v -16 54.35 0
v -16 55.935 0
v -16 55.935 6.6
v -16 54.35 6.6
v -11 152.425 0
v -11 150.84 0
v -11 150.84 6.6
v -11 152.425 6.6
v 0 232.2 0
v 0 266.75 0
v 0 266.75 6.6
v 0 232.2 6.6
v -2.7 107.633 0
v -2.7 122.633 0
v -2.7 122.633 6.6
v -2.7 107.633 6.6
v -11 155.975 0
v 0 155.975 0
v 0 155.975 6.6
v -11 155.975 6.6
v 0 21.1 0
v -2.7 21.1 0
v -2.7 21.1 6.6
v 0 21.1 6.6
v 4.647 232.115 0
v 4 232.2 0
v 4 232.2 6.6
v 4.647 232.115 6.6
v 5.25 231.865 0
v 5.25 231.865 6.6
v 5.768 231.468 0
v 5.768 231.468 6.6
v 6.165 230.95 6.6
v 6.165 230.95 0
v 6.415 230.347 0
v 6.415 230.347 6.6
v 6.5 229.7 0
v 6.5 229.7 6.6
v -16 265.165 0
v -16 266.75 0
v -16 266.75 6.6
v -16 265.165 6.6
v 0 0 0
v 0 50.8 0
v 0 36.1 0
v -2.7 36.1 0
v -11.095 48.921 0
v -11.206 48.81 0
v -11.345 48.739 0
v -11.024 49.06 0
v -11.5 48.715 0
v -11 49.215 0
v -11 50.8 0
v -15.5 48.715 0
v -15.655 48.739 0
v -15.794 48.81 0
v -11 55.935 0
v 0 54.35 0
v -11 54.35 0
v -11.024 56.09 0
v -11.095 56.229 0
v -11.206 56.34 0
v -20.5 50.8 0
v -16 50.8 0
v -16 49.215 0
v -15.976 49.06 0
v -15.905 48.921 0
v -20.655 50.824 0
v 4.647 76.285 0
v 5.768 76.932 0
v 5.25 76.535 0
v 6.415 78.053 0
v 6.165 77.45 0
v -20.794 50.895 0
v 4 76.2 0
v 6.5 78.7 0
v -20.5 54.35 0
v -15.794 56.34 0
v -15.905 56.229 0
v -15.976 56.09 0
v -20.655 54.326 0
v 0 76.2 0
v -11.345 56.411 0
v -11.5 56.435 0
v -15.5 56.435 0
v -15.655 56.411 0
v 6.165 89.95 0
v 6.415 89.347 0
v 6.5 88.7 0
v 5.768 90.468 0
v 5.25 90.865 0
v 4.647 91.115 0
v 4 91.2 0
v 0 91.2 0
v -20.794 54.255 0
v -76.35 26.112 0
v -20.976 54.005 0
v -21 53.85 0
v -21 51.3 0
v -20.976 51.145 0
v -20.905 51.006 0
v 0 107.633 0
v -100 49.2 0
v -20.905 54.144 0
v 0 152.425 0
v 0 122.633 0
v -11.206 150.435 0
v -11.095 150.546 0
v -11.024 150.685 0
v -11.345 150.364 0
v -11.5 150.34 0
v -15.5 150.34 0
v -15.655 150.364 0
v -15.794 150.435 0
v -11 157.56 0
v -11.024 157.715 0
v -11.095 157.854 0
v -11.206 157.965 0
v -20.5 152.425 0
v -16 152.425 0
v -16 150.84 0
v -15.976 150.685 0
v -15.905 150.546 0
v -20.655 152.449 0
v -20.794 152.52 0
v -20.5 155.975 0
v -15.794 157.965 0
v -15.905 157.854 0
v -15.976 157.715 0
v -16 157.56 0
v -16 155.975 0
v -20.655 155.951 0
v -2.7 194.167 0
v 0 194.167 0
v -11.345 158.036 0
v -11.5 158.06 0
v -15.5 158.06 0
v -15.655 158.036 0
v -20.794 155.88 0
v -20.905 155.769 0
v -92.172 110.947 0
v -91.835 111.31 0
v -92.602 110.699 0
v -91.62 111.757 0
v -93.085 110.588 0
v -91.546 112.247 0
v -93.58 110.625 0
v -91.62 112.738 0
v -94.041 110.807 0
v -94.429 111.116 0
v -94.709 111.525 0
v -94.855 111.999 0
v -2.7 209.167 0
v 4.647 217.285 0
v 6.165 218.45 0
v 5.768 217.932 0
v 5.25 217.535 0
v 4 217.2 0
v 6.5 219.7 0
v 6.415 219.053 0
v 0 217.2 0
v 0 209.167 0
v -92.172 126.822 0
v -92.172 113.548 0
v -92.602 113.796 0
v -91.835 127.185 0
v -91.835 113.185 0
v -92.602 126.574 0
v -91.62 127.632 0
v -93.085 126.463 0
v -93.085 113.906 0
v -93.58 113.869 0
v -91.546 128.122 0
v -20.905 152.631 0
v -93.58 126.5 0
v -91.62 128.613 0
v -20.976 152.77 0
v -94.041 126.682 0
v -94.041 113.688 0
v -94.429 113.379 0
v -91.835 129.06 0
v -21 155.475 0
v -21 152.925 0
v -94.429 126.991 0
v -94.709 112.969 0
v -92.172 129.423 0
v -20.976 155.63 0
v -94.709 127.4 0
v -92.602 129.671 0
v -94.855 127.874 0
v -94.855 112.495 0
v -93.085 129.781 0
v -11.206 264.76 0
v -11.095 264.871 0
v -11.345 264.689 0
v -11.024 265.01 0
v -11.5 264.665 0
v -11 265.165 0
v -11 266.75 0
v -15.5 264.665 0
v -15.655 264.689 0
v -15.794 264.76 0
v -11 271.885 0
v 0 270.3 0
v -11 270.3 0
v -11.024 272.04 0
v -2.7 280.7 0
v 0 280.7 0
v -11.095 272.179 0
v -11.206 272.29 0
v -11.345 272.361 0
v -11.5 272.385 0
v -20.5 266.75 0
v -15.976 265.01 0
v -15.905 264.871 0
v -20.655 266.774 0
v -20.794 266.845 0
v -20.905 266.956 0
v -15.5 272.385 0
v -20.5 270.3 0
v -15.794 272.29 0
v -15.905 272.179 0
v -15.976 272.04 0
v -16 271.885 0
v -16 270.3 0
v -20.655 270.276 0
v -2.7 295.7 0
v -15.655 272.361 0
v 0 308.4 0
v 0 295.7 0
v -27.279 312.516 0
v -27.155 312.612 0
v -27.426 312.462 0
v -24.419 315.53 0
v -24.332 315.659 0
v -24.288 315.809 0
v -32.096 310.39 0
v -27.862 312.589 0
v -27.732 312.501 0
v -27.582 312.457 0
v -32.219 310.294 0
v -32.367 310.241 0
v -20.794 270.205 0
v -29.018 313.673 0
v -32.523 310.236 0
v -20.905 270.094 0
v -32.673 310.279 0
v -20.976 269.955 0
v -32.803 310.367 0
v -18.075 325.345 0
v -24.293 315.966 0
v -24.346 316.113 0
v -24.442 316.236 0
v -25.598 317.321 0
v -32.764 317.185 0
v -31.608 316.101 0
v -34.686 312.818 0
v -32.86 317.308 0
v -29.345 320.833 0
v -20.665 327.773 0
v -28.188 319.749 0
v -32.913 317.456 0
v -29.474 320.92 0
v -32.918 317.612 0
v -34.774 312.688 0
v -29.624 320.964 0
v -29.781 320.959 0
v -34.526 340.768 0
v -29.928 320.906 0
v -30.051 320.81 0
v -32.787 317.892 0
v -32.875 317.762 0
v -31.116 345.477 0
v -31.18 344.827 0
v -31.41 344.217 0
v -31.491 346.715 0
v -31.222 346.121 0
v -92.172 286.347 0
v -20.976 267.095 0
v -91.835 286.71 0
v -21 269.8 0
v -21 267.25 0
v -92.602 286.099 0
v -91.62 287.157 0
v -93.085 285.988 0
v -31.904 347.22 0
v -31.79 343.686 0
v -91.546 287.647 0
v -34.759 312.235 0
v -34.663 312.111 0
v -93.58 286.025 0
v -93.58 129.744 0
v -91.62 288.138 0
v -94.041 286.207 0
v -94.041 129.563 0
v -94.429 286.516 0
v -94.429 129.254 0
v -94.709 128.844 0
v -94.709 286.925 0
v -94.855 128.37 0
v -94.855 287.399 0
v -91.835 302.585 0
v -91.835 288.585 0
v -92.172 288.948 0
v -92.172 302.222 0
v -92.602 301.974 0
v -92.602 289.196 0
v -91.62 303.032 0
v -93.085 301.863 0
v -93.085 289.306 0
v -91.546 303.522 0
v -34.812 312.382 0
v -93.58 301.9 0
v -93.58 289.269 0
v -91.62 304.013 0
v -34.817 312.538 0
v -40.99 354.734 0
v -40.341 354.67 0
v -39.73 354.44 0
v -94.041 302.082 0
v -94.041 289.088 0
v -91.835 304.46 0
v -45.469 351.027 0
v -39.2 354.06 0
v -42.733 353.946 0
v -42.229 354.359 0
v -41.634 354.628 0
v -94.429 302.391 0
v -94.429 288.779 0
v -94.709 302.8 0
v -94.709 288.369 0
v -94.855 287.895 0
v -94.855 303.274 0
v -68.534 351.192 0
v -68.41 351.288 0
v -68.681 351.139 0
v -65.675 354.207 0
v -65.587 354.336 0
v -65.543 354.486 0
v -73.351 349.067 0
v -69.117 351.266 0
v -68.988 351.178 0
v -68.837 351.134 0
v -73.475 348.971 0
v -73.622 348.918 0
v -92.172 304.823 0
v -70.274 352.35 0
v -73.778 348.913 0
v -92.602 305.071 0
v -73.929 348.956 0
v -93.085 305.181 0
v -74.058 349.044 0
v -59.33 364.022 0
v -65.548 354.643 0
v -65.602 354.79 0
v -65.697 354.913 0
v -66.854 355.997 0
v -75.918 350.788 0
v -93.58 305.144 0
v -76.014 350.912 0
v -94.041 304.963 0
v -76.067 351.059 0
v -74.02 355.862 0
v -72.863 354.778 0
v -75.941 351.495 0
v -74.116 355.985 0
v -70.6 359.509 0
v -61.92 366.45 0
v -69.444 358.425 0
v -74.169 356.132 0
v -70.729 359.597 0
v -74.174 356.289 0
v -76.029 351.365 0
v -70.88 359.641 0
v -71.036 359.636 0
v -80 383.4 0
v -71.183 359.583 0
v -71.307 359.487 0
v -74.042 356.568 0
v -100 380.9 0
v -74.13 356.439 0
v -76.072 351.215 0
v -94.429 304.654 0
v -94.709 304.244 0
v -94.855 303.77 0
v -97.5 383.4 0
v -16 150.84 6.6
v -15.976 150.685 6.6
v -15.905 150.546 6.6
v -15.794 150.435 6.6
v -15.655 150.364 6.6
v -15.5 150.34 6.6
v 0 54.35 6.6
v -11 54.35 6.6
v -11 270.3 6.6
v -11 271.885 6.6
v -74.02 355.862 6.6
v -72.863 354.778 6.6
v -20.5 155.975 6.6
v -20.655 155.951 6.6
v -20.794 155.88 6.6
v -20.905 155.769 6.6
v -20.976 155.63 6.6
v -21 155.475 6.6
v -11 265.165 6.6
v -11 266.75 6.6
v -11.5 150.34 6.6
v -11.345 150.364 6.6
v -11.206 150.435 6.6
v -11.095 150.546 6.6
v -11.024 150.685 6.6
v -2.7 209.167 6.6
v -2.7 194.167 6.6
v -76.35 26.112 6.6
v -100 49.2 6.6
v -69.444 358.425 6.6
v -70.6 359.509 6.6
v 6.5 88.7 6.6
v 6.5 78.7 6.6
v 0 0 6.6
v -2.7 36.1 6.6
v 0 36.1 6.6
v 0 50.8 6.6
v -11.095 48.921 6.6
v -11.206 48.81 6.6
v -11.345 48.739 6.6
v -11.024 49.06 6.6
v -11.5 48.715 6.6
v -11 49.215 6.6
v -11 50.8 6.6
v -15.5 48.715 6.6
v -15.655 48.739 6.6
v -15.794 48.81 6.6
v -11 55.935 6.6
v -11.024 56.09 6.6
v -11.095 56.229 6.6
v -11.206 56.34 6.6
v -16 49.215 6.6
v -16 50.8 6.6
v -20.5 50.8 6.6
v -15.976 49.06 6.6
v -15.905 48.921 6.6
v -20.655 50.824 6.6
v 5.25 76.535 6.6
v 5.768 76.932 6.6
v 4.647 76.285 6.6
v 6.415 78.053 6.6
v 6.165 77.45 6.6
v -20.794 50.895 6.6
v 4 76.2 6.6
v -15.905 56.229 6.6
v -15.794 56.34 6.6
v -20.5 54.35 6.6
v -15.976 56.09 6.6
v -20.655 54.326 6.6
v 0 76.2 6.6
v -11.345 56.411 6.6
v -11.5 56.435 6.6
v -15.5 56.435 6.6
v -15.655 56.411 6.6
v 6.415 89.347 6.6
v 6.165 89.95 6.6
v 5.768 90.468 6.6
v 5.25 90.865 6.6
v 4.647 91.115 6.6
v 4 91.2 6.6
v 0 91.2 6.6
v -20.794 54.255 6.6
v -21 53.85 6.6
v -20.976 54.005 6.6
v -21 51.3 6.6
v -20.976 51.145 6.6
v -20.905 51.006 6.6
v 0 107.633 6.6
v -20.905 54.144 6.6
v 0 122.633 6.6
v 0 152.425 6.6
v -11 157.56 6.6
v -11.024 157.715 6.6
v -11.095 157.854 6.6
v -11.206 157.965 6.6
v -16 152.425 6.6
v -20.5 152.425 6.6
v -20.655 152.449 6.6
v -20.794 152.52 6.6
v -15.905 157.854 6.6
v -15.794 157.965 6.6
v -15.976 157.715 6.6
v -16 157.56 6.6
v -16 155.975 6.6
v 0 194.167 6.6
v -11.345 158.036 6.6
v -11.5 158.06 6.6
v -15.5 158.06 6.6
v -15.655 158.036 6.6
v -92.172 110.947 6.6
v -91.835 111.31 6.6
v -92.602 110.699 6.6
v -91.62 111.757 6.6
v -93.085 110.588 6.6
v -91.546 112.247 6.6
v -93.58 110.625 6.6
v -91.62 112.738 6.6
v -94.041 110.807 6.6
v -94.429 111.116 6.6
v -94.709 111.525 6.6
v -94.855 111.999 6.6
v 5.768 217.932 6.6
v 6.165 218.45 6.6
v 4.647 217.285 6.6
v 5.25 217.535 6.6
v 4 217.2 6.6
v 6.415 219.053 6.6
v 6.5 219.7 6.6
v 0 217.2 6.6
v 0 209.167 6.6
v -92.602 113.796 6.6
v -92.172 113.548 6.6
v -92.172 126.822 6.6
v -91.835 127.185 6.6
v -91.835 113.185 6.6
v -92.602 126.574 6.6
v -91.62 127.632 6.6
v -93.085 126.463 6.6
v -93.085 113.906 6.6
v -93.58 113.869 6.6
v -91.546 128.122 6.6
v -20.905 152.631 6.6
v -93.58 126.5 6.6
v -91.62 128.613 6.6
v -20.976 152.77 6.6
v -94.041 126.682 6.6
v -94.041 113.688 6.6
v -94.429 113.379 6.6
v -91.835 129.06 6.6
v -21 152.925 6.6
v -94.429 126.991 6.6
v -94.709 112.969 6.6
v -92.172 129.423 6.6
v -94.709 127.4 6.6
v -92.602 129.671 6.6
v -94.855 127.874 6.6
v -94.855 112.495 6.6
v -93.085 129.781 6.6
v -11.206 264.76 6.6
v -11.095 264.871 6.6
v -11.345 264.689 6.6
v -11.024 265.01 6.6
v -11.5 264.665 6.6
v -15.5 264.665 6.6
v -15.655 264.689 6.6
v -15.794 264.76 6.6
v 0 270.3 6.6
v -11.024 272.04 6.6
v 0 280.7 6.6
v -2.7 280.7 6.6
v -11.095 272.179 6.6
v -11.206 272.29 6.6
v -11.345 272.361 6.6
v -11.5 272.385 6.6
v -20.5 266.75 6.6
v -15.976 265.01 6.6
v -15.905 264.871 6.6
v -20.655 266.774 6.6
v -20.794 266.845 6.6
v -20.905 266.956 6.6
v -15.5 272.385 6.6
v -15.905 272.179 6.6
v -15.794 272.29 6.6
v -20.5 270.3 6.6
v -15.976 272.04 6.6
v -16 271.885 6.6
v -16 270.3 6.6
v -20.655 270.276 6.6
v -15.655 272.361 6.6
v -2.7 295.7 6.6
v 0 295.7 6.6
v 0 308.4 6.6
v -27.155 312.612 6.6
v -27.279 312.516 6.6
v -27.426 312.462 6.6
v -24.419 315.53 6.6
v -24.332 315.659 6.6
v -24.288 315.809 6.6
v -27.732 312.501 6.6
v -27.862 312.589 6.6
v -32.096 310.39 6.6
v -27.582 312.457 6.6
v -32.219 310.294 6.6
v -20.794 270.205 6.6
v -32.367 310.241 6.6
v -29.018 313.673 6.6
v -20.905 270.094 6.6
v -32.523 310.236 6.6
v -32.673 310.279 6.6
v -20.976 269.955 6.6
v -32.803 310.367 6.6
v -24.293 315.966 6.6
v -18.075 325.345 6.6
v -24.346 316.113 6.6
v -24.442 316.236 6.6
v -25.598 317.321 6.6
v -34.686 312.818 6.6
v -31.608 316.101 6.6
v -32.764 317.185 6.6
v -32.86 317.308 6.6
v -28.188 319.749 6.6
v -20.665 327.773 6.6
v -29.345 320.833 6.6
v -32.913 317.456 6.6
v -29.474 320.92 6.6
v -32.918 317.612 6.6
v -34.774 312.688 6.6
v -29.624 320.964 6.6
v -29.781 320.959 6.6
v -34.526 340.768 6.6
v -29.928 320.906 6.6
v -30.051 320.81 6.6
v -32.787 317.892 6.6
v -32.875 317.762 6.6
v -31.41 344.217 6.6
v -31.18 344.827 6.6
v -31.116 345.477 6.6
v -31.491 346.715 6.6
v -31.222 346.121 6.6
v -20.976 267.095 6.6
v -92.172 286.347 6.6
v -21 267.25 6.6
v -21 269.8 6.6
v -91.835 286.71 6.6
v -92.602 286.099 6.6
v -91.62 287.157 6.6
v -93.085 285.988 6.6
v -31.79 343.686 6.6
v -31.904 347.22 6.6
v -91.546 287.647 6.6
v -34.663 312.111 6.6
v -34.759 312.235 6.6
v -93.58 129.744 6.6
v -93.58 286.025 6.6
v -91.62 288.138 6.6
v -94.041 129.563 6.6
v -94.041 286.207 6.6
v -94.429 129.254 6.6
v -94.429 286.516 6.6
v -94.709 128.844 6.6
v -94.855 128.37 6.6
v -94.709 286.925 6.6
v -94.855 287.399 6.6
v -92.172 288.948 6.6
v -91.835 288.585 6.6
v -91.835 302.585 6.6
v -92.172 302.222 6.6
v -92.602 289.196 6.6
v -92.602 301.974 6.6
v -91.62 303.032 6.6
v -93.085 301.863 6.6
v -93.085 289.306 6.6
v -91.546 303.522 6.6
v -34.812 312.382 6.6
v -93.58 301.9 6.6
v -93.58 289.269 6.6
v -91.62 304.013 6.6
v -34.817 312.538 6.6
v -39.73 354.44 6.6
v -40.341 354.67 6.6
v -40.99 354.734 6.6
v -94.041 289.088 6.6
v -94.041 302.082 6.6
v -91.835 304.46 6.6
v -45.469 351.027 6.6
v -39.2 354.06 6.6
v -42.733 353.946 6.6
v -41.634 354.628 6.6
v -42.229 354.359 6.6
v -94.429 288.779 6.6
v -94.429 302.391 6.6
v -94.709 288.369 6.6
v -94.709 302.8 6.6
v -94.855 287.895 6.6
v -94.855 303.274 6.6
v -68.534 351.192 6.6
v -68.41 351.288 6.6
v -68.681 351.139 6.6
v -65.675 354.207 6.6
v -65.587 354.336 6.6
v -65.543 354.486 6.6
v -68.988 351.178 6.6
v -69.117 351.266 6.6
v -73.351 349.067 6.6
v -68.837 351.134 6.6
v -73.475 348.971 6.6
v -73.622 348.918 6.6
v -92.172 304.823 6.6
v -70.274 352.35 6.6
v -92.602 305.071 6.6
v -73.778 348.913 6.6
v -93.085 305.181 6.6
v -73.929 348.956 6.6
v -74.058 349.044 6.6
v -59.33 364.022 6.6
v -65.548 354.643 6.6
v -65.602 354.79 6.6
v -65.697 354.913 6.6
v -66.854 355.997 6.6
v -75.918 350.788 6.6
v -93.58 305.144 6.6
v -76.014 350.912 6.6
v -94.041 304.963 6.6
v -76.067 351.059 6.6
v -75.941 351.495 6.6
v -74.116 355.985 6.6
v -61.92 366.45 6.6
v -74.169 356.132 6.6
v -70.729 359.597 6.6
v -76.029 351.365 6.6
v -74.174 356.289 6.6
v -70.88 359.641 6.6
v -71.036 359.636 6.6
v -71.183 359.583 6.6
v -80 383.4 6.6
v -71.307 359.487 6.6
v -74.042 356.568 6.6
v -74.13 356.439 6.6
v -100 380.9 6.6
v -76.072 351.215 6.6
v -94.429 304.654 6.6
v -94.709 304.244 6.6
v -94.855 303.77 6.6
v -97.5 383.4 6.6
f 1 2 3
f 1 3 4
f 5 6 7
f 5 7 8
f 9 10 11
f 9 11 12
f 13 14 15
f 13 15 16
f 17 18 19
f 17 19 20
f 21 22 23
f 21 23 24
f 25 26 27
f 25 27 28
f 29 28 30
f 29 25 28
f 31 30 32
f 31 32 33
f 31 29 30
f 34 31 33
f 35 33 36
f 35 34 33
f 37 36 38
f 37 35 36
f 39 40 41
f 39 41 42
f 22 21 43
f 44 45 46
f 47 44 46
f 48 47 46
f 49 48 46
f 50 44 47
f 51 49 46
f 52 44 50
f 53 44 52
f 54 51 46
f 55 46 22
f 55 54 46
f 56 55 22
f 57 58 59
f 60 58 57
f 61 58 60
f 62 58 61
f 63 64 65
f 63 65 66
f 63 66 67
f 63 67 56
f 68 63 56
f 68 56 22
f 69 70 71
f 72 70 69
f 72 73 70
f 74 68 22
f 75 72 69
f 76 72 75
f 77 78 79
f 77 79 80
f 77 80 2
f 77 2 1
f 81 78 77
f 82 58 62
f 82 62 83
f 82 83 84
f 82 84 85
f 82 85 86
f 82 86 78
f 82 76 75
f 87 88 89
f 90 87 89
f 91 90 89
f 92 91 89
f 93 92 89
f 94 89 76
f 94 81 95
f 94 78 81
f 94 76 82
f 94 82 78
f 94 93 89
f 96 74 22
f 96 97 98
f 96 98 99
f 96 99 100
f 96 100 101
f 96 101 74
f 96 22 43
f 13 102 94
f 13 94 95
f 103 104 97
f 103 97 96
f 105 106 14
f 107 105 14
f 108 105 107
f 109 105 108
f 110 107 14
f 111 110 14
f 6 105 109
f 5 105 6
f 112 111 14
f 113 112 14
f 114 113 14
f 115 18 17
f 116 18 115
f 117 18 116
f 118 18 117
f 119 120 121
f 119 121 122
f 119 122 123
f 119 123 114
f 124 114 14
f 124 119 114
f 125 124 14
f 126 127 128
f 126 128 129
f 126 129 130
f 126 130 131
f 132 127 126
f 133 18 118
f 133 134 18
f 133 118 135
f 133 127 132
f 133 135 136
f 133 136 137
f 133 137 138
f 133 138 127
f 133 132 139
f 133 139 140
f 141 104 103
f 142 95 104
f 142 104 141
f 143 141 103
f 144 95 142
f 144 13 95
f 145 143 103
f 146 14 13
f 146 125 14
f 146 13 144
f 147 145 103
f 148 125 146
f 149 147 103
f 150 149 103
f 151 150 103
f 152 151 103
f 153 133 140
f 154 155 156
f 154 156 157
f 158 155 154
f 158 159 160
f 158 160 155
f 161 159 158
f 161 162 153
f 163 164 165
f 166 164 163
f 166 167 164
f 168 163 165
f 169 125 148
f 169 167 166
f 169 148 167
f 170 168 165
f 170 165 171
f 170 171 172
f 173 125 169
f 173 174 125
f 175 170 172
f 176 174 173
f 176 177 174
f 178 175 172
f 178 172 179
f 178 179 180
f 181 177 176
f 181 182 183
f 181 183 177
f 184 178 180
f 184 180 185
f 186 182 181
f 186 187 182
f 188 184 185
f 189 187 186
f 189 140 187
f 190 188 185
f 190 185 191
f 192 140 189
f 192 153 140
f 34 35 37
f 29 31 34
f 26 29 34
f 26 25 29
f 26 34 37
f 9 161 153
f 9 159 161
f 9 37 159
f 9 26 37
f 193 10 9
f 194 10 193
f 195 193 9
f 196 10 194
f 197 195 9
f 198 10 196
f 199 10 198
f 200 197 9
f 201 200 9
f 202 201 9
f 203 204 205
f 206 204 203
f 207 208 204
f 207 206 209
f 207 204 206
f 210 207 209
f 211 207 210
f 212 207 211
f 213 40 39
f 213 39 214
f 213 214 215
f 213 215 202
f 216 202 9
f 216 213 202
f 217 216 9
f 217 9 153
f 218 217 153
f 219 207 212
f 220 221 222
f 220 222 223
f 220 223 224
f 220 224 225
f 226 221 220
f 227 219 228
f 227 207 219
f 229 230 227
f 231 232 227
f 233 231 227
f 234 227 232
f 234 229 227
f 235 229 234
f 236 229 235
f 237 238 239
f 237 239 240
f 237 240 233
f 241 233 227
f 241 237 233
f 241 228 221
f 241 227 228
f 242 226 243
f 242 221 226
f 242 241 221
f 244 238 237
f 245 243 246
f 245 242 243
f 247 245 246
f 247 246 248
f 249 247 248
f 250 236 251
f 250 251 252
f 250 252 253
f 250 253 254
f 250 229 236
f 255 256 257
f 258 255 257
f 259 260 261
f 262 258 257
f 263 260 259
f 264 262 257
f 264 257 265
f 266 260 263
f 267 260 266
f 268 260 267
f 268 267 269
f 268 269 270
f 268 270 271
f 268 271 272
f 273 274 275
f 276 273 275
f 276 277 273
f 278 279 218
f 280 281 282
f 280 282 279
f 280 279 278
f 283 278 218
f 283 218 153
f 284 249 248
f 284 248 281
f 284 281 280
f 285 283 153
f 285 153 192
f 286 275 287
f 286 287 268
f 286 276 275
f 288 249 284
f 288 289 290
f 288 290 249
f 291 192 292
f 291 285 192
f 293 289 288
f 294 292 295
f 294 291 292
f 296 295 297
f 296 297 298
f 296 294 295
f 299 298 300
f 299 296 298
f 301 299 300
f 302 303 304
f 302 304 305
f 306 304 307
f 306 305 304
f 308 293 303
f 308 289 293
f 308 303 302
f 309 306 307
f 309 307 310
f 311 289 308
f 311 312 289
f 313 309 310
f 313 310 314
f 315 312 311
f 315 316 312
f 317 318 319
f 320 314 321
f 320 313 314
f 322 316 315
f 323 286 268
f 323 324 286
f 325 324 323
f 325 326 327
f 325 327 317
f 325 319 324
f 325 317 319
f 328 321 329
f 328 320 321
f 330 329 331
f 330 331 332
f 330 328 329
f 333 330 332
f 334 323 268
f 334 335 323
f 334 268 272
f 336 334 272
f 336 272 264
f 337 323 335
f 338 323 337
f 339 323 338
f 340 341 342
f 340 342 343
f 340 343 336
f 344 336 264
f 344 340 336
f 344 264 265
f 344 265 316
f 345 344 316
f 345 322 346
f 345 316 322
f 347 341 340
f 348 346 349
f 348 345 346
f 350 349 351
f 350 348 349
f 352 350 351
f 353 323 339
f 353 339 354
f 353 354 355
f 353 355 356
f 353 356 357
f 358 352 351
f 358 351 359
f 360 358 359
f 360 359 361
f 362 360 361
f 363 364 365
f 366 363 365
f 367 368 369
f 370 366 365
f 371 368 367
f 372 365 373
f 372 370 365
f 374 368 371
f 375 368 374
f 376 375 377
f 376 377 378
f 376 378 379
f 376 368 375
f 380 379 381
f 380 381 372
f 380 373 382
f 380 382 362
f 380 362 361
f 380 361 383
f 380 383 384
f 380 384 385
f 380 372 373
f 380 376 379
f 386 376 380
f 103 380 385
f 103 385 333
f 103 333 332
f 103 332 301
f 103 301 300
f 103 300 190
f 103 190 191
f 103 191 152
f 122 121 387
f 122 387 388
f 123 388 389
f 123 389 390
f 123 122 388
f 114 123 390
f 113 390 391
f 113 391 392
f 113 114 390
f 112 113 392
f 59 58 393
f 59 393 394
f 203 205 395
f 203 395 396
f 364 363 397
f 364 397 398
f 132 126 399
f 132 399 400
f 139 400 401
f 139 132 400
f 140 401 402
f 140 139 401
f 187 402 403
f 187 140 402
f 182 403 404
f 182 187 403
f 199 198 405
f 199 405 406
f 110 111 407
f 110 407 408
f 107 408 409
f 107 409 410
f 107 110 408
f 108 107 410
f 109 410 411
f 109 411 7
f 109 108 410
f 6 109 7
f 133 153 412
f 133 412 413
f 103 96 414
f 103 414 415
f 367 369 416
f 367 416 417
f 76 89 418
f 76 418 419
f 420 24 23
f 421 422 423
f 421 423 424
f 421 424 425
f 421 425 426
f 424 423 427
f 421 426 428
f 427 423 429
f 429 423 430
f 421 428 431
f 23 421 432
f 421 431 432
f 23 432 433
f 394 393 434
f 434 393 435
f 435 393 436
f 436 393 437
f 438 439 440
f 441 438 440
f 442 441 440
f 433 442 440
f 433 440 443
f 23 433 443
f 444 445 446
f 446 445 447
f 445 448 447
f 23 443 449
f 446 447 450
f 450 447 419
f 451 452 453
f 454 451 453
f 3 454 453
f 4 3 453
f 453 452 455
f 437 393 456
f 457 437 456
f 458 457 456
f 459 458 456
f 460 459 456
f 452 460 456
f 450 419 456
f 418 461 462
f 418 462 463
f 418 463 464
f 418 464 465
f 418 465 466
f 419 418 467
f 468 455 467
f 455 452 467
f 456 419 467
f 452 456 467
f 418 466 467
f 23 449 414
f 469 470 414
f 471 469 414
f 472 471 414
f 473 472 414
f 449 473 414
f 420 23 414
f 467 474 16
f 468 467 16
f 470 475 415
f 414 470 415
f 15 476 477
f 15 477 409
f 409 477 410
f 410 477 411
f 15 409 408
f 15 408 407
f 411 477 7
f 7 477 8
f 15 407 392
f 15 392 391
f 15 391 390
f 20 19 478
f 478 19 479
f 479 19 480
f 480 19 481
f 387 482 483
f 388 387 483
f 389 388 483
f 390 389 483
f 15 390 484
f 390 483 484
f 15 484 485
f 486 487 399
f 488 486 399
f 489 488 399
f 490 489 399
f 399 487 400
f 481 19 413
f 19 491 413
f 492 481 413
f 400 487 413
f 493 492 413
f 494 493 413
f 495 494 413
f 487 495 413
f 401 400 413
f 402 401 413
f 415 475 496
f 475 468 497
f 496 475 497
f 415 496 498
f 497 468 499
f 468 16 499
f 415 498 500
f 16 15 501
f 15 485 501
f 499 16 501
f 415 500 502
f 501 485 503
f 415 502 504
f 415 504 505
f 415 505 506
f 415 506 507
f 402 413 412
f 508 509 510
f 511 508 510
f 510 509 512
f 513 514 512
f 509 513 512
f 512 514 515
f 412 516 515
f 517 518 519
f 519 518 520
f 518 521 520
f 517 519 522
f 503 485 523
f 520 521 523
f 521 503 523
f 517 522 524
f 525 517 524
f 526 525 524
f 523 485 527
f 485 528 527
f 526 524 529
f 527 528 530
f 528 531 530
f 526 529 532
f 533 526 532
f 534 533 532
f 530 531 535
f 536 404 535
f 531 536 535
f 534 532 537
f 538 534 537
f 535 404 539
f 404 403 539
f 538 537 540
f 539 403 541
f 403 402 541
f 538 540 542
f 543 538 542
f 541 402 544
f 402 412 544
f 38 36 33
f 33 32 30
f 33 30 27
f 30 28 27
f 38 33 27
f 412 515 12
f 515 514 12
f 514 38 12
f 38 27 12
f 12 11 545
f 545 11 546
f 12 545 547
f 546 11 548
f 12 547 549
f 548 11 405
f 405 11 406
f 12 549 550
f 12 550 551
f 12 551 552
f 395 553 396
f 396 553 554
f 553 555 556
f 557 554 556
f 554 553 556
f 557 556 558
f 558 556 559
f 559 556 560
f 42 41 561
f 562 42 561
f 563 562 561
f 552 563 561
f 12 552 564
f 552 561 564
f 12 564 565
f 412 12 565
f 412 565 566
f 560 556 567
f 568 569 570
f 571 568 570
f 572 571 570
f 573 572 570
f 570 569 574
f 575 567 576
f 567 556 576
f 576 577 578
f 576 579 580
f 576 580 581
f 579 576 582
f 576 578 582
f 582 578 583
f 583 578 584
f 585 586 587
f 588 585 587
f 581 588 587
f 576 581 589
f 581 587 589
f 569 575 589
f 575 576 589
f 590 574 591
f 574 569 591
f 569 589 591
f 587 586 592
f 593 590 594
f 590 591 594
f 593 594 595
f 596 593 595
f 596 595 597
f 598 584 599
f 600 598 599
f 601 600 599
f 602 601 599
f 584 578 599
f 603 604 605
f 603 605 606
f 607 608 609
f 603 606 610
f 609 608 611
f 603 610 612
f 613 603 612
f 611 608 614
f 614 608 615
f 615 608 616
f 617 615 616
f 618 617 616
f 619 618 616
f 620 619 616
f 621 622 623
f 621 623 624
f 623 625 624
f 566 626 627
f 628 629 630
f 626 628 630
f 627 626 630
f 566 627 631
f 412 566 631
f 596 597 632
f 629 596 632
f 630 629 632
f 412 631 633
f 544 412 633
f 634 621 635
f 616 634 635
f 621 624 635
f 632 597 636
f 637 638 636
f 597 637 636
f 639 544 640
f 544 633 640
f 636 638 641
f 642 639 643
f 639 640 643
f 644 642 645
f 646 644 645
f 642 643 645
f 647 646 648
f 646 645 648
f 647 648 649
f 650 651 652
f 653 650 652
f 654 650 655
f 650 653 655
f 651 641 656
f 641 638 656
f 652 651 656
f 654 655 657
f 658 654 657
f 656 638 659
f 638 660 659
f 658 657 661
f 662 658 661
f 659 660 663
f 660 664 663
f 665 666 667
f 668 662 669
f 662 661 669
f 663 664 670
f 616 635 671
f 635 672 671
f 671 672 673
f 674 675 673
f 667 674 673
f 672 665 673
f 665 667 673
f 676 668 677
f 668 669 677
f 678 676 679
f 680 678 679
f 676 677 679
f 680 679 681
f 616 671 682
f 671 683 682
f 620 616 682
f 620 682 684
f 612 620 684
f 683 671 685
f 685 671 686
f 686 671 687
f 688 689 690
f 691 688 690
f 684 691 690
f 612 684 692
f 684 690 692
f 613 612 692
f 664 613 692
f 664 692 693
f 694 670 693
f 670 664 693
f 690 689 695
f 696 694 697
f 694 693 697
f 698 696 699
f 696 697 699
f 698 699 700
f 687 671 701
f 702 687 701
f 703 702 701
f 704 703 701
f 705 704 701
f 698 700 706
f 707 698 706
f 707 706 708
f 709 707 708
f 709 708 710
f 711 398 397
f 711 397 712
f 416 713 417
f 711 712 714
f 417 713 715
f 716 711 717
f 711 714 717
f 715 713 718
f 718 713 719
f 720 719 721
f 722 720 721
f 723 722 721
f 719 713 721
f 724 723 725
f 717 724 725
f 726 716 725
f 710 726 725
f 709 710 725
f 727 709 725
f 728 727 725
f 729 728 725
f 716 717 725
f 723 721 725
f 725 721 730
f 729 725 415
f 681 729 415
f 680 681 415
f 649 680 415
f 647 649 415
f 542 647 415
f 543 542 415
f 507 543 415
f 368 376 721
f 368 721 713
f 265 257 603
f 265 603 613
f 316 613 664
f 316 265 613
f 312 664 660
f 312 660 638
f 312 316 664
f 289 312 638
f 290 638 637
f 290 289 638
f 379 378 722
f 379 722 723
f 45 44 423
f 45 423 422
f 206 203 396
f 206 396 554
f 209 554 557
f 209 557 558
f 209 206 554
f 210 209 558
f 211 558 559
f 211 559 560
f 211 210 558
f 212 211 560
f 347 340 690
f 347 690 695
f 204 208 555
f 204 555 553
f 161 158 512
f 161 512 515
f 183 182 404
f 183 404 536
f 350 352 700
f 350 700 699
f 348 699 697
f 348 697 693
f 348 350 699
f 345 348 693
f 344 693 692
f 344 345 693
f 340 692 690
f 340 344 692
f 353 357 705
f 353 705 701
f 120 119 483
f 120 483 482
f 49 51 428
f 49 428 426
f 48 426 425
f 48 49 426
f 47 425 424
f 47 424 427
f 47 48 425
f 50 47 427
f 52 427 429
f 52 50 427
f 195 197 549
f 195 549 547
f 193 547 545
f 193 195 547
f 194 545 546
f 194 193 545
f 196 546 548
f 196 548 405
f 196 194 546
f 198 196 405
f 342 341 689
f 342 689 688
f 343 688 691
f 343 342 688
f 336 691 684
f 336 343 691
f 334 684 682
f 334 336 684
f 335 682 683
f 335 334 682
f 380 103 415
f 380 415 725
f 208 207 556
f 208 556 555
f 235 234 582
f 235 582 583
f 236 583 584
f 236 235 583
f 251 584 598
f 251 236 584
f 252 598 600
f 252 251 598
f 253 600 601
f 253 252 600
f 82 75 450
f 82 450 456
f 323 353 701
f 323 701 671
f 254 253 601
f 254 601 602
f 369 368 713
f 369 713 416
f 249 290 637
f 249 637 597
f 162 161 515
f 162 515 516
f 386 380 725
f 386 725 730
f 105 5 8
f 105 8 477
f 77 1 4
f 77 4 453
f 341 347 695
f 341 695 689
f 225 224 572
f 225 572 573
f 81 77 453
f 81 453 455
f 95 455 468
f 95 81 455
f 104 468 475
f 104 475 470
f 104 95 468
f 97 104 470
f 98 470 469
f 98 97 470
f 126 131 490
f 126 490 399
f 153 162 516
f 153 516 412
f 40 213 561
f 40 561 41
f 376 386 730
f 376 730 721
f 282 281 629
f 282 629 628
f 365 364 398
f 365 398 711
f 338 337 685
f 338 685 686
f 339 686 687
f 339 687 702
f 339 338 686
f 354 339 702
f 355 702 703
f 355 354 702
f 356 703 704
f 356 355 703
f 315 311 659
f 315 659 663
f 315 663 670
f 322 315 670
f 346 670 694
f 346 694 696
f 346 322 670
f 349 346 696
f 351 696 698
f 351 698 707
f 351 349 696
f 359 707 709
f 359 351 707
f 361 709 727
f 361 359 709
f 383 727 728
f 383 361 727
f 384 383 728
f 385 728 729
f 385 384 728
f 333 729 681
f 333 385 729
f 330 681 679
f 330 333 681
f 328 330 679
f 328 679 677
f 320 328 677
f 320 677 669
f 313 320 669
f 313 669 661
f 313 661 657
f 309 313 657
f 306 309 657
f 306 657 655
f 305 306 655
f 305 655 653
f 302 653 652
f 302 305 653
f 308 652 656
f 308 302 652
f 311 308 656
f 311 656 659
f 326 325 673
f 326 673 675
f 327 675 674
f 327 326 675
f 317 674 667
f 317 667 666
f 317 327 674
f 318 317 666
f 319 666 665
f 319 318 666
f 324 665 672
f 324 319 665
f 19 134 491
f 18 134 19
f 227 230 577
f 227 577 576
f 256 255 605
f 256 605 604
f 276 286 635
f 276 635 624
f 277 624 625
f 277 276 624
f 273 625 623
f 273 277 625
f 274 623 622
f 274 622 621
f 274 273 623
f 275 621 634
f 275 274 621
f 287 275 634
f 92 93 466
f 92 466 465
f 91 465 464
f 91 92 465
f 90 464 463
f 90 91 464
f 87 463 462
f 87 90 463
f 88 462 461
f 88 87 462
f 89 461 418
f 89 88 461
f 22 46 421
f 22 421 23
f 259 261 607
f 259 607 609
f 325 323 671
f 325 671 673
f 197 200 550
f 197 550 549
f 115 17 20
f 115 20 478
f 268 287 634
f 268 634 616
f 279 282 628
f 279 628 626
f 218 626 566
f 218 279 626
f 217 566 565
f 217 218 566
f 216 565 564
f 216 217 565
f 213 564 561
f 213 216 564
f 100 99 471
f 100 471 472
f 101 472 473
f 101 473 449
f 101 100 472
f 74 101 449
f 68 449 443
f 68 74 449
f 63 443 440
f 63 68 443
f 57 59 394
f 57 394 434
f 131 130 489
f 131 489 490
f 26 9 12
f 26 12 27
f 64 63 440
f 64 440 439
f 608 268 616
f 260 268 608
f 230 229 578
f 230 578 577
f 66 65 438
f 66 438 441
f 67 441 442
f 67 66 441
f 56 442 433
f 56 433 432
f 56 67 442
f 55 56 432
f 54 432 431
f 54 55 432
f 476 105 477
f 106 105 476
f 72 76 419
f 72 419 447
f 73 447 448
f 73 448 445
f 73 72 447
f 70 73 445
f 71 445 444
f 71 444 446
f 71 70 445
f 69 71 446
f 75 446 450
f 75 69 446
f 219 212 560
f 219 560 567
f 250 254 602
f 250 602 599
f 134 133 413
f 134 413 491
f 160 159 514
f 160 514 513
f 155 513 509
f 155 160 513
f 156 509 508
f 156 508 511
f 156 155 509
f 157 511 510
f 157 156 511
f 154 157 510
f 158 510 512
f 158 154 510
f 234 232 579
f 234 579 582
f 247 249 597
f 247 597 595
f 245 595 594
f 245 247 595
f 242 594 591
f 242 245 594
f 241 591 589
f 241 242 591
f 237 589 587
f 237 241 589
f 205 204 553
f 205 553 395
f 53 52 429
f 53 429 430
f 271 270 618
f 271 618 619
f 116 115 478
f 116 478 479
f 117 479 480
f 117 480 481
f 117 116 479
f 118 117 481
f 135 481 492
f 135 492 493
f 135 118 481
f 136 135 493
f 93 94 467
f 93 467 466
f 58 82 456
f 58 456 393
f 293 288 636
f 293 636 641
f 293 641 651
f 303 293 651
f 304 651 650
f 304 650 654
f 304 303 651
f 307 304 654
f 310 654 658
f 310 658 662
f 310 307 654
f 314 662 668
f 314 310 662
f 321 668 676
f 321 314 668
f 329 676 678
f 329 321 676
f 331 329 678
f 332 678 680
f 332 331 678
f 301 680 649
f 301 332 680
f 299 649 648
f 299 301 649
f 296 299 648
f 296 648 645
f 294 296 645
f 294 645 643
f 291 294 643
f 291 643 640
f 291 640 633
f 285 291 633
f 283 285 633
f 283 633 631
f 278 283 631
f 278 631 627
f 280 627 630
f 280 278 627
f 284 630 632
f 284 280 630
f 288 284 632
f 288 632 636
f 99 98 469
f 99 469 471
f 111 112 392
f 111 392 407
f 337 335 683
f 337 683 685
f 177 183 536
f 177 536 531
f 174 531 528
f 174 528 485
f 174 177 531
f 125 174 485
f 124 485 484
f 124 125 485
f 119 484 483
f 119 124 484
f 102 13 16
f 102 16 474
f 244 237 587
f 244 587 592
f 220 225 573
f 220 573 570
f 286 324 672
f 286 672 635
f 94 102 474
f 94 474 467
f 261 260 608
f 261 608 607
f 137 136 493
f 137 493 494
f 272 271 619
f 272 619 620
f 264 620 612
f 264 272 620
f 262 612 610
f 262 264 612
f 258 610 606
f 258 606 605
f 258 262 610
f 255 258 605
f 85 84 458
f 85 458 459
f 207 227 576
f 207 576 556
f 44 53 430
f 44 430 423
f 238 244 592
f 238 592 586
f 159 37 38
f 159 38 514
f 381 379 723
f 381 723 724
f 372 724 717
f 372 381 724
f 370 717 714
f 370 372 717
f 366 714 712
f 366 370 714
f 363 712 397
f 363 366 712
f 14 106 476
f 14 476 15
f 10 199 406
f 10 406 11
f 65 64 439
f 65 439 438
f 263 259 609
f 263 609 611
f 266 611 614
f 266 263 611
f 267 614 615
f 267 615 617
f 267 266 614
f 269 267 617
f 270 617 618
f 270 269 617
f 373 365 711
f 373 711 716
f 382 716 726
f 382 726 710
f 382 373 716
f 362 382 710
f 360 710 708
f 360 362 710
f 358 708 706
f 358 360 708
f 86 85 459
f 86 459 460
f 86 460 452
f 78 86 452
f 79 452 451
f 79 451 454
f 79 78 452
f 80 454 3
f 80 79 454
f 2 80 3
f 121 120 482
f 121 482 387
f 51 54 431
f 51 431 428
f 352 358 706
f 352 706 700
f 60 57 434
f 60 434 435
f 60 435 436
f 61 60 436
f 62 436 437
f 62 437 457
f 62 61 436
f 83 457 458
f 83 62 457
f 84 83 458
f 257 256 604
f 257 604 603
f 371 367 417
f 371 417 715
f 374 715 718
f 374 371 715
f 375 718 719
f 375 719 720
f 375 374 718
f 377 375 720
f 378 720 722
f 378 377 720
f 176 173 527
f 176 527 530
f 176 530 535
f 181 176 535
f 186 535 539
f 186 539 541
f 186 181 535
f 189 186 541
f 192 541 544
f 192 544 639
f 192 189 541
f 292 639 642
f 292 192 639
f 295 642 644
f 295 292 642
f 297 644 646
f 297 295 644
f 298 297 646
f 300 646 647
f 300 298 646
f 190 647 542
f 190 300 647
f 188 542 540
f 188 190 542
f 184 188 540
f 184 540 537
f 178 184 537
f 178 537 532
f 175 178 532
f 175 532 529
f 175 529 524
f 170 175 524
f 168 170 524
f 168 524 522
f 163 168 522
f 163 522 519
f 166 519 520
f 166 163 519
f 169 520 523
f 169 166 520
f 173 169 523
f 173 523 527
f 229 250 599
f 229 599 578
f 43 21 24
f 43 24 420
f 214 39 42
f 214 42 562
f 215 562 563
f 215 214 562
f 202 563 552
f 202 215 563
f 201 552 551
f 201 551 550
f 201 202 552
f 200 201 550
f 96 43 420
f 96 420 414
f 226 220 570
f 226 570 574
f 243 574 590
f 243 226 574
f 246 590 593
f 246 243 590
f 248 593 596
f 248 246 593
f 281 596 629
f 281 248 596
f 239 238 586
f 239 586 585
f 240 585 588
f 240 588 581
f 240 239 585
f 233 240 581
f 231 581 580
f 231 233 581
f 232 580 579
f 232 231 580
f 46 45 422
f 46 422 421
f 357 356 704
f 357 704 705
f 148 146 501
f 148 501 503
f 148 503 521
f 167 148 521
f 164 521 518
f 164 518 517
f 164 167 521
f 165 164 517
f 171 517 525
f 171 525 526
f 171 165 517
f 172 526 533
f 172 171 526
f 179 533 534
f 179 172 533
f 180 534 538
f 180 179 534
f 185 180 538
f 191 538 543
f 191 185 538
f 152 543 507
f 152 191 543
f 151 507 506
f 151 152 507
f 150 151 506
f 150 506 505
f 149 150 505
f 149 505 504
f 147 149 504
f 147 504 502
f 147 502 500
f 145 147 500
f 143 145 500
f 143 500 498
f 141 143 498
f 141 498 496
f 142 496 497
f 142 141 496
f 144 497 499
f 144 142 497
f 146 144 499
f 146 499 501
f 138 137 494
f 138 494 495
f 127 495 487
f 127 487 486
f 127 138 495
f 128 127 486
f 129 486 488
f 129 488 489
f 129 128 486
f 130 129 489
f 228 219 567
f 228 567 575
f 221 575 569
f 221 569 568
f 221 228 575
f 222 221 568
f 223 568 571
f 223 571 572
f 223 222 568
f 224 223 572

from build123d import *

# Parameters (mm, degrees)
MODEL_R             = 1.6637
BOSS_EXTRUDE1_DEPTH = 6.6


with BuildPart() as part:
    # Model → Boss-Extrude1 (new body)
    with BuildSketch(Plane.XY):
        with BuildLine():
            Line((-2.7, 21.1), (0, 21.1))
            Line((0, 21.1), (0, 0))
            Line((0, 0), (-76.35, 26.1117))
            Line((-76.35, 26.1117), (-100, 49.2))
            Line((-100, 49.2), (-100, 380.9))
            Line((-100, 380.9), (-97.5, 383.4))
            Line((-97.5, 383.4), (-80, 383.4))
            Line((-80, 383.4), (-61.92031318, 366.450293606))
            Line((-61.92031318, 366.450293606), (-69.443665597, 358.42538436))
            Line((-69.443665597, 358.42538436), (-70.599982066, 359.50943105))
            ThreePointArc((-70.599982066, 359.50943105), (-70.958073277, 359.644402505), (-71.306721232, 359.486633012))
            Line((-71.306721232, 359.486633012), (-74.042485748, 356.568484196))
            ThreePointArc((-74.042485748, 356.568484196), (-74.177457203, 356.210392984), (-74.01968771, 355.861745029))
            Line((-74.01968771, 355.861745029), (-72.863371242, 354.77769834))
            Line((-72.863371242, 354.77769834), (-75.941106322, 351.494780921))
            ThreePointArc((-75.941106322, 351.494780921), (-76.076077777, 351.13668971), (-75.918308284, 350.788041755))
            Line((-75.918308284, 350.788041755), (-74.057988413, 349.043991876))
            ThreePointArc((-74.057988413, 349.043991876), (-73.699897202, 348.909020421), (-73.351249247, 349.066789913))
            Line((-73.351249247, 349.066789913), (-70.273514167, 352.349707332))
            Line((-70.273514167, 352.349707332), (-69.117197698, 351.265660643))
            ThreePointArc((-69.117197698, 351.265660643), (-68.759106487, 351.130689188), (-68.410458532, 351.288458681))
            Line((-68.410458532, 351.288458681), (-65.674694016, 354.206607497))
            ThreePointArc((-65.674694016, 354.206607497), (-65.539722561, 354.564698709), (-65.697492054, 354.913346664))
            Line((-65.697492054, 354.913346664), (-66.853808523, 355.997393353))
            Line((-66.853808523, 355.997393353), (-59.330456105, 364.022302598))
            Line((-59.330456105, 364.022302598), (-45.469249226, 351.02742115))
            Line((-45.469249226, 351.02742115), (-42.733484711, 353.945569966))
            ThreePointArc((-42.733484711, 353.945569966), (-40.990244935, 354.73441743), (-39.199788878, 354.059560154))
            Line((-39.199788878, 354.059560154), (-31.904416837, 347.220148866))
            ThreePointArc((-31.904416837, 347.220148866), (-31.115569373, 345.47690909), (-31.790426649, 343.686453033))
            Line((-31.790426649, 343.686453033), (-34.526191164, 340.768304216))
            Line((-34.526191164, 340.768304216), (-20.664984286, 327.773422768))
            Line((-20.664984286, 327.773422768), (-28.188336703, 319.748513522))
            Line((-28.188336703, 319.748513522), (-29.344653172, 320.832560211))
            ThreePointArc((-29.344653172, 320.832560211), (-29.702744383, 320.967531667), (-30.051392338, 320.809762174))
            Line((-30.051392338, 320.809762174), (-32.787156854, 317.891613357))
            ThreePointArc((-32.787156854, 317.891613357), (-32.922128309, 317.533522146), (-32.764358816, 317.184874191))
            Line((-32.764358816, 317.184874191), (-31.608042348, 316.100827502))
            Line((-31.608042348, 316.100827502), (-34.685777428, 312.817910083))
            ThreePointArc((-34.685777428, 312.817910083), (-34.820748883, 312.459818871), (-34.66297939, 312.111170916))
            Line((-34.66297939, 312.111170916), (-32.802659519, 310.367121038))
            ThreePointArc((-32.802659519, 310.367121038), (-32.444568308, 310.232149583), (-32.095920353, 310.389919075))
            Line((-32.095920353, 310.389919075), (-29.018185273, 313.672836494))
            Line((-29.018185273, 313.672836494), (-27.861868804, 312.588789805))
            ThreePointArc((-27.861868804, 312.588789805), (-27.503777593, 312.45381835), (-27.155129638, 312.611587842))
            Line((-27.155129638, 312.611587842), (-24.419365122, 315.529736659))
            ThreePointArc((-24.419365122, 315.529736659), (-24.284393667, 315.88782787), (-24.44216316, 316.236475825))
            Line((-24.44216316, 316.236475825), (-25.598479629, 317.320522515))
            Line((-25.598479629, 317.320522515), (-18.075127211, 325.34543176))
            Line((-18.075127211, 325.34543176), (0, 308.4))
            Line((0, 308.4), (0, 295.7))
            Line((0, 295.7), (-2.7, 295.7))
            Line((-2.7, 295.7), (-2.7, 280.7))
            Line((-2.7, 280.7), (0, 280.7))
            Line((0, 280.7), (0, 270.3))
            Line((0, 270.3), (-11, 270.3))
            Line((-11, 270.3), (-11, 271.885))
            ThreePointArc((-11, 271.885), (-11.146446609, 272.238553391), (-11.5, 272.385))
            Line((-11.5, 272.385), (-15.5, 272.385))
            ThreePointArc((-15.5, 272.385), (-15.853553391, 272.238553391), (-16, 271.885))
            Line((-16, 271.885), (-16, 270.3))
            Line((-16, 270.3), (-20.5, 270.3))
            ThreePointArc((-20.5, 270.3), (-20.853553391, 270.153553391), (-21, 269.8))
            Line((-21, 269.8), (-21, 267.25))
            ThreePointArc((-21, 267.25), (-20.853553391, 266.896446609), (-20.5, 266.75))
            Line((-20.5, 266.75), (-16, 266.75))
            Line((-16, 266.75), (-16, 265.165))
            ThreePointArc((-16, 265.165), (-15.853553391, 264.811446609), (-15.5, 264.665))
            Line((-15.5, 264.665), (-11.5, 264.665))
            ThreePointArc((-11.5, 264.665), (-11.146446609, 264.811446609), (-11, 265.165))
            Line((-11, 265.165), (-11, 266.75))
            Line((-11, 266.75), (0, 266.75))
            Line((0, 266.75), (0, 232.2))
            Line((0, 232.2), (4, 232.2))
            ThreePointArc((4, 232.2), (5.767766953, 231.467766953), (6.5, 229.7))
            Line((6.5, 229.7), (6.5, 219.7))
            ThreePointArc((6.5, 219.7), (5.767766953, 217.932233047), (4, 217.2))
            Line((4, 217.2), (0, 217.2))
            Line((0, 217.2), (0, 209.166666667))
            Line((0, 209.166666667), (-2.7, 209.166666667))
            Line((-2.7, 209.166666667), (-2.7, 194.166666667))
            Line((-2.7, 194.166666667), (0, 194.166666667))
            Line((0, 194.166666667), (0, 155.975))
            Line((0, 155.975), (-11, 155.975))
            Line((-11, 155.975), (-11, 157.56))
            ThreePointArc((-11, 157.56), (-11.146446609, 157.913553391), (-11.5, 158.06))
            Line((-11.5, 158.06), (-15.5, 158.06))
            ThreePointArc((-15.5, 158.06), (-15.853553391, 157.913553391), (-16, 157.56))
            Line((-16, 157.56), (-16, 155.975))
            Line((-16, 155.975), (-20.5, 155.975))
            ThreePointArc((-20.5, 155.975), (-20.853553391, 155.828553391), (-21, 155.475))
            Line((-21, 155.475), (-21, 152.925))
            ThreePointArc((-21, 152.925), (-20.853553391, 152.571446609), (-20.5, 152.425))
            Line((-20.5, 152.425), (-16, 152.425))
            Line((-16, 152.425), (-16, 150.84))
            ThreePointArc((-16, 150.84), (-15.853553391, 150.486446609), (-15.5, 150.34))
            Line((-15.5, 150.34), (-11.5, 150.34))
            ThreePointArc((-11.5, 150.34), (-11.146446609, 150.486446609), (-11, 150.84))
            Line((-11, 150.84), (-11, 152.425))
            Line((-11, 152.425), (0, 152.425))
            Line((0, 152.425), (0, 122.633333333))
            Line((0, 122.633333333), (-2.7, 122.633333333))
            Line((-2.7, 122.633333333), (-2.7, 107.633333333))
            Line((-2.7, 107.633333333), (0, 107.633333333))
            Line((0, 107.633333333), (0, 91.2))
            Line((0, 91.2), (4, 91.2))
            ThreePointArc((4, 91.2), (5.767766953, 90.467766953), (6.5, 88.7))
            Line((6.5, 88.7), (6.5, 78.7))
            ThreePointArc((6.5, 78.7), (5.767766953, 76.932233047), (4, 76.2))
            Line((4, 76.2), (0, 76.2))
            Line((0, 76.2), (0, 54.35))
            Line((0, 54.35), (-11, 54.35))
            Line((-11, 54.35), (-11, 55.935))
            ThreePointArc((-11, 55.935), (-11.146446609, 56.288553391), (-11.5, 56.435))
            Line((-11.5, 56.435), (-15.5, 56.435))
            ThreePointArc((-15.5, 56.435), (-15.853553391, 56.288553391), (-16, 55.935))
            Line((-16, 55.935), (-16, 54.35))
            Line((-16, 54.35), (-20.5, 54.35))
            ThreePointArc((-20.5, 54.35), (-20.853553391, 54.203553391), (-21, 53.85))
            Line((-21, 53.85), (-21, 51.3))
            ThreePointArc((-21, 51.3), (-20.853553391, 50.946446609), (-20.5, 50.8))
            Line((-20.5, 50.8), (-16, 50.8))
            Line((-16, 50.8), (-16, 49.215))
            ThreePointArc((-16, 49.215), (-15.853553391, 48.861446609), (-15.5, 48.715))
            Line((-15.5, 48.715), (-11.5, 48.715))
            ThreePointArc((-11.5, 48.715), (-11.146446609, 48.861446609), (-11, 49.215))
            Line((-11, 49.215), (-11, 50.8))
            Line((-11, 50.8), (0, 50.8))
            Line((0, 50.8), (0, 36.1))
            Line((0, 36.1), (-2.7, 36.1))
            Line((-2.7, 36.1), (-2.7, 21.1))
        make_face()
        with Locations((-93.2095625, 128.122348004)):
            Circle(MODEL_R, mode=Mode.SUBTRACT)
        with Locations((-93.2095625, 112.247348004)):
            Circle(MODEL_R, mode=Mode.SUBTRACT)
        with Locations((-93.2095625, 303.522348003)):
            Circle(MODEL_R, mode=Mode.SUBTRACT)
        with Locations((-93.2095625, 287.647348003)):
            Circle(MODEL_R, mode=Mode.SUBTRACT)
    extrude(amount=BOSS_EXTRUDE1_DEPTH)


solid = part.part
